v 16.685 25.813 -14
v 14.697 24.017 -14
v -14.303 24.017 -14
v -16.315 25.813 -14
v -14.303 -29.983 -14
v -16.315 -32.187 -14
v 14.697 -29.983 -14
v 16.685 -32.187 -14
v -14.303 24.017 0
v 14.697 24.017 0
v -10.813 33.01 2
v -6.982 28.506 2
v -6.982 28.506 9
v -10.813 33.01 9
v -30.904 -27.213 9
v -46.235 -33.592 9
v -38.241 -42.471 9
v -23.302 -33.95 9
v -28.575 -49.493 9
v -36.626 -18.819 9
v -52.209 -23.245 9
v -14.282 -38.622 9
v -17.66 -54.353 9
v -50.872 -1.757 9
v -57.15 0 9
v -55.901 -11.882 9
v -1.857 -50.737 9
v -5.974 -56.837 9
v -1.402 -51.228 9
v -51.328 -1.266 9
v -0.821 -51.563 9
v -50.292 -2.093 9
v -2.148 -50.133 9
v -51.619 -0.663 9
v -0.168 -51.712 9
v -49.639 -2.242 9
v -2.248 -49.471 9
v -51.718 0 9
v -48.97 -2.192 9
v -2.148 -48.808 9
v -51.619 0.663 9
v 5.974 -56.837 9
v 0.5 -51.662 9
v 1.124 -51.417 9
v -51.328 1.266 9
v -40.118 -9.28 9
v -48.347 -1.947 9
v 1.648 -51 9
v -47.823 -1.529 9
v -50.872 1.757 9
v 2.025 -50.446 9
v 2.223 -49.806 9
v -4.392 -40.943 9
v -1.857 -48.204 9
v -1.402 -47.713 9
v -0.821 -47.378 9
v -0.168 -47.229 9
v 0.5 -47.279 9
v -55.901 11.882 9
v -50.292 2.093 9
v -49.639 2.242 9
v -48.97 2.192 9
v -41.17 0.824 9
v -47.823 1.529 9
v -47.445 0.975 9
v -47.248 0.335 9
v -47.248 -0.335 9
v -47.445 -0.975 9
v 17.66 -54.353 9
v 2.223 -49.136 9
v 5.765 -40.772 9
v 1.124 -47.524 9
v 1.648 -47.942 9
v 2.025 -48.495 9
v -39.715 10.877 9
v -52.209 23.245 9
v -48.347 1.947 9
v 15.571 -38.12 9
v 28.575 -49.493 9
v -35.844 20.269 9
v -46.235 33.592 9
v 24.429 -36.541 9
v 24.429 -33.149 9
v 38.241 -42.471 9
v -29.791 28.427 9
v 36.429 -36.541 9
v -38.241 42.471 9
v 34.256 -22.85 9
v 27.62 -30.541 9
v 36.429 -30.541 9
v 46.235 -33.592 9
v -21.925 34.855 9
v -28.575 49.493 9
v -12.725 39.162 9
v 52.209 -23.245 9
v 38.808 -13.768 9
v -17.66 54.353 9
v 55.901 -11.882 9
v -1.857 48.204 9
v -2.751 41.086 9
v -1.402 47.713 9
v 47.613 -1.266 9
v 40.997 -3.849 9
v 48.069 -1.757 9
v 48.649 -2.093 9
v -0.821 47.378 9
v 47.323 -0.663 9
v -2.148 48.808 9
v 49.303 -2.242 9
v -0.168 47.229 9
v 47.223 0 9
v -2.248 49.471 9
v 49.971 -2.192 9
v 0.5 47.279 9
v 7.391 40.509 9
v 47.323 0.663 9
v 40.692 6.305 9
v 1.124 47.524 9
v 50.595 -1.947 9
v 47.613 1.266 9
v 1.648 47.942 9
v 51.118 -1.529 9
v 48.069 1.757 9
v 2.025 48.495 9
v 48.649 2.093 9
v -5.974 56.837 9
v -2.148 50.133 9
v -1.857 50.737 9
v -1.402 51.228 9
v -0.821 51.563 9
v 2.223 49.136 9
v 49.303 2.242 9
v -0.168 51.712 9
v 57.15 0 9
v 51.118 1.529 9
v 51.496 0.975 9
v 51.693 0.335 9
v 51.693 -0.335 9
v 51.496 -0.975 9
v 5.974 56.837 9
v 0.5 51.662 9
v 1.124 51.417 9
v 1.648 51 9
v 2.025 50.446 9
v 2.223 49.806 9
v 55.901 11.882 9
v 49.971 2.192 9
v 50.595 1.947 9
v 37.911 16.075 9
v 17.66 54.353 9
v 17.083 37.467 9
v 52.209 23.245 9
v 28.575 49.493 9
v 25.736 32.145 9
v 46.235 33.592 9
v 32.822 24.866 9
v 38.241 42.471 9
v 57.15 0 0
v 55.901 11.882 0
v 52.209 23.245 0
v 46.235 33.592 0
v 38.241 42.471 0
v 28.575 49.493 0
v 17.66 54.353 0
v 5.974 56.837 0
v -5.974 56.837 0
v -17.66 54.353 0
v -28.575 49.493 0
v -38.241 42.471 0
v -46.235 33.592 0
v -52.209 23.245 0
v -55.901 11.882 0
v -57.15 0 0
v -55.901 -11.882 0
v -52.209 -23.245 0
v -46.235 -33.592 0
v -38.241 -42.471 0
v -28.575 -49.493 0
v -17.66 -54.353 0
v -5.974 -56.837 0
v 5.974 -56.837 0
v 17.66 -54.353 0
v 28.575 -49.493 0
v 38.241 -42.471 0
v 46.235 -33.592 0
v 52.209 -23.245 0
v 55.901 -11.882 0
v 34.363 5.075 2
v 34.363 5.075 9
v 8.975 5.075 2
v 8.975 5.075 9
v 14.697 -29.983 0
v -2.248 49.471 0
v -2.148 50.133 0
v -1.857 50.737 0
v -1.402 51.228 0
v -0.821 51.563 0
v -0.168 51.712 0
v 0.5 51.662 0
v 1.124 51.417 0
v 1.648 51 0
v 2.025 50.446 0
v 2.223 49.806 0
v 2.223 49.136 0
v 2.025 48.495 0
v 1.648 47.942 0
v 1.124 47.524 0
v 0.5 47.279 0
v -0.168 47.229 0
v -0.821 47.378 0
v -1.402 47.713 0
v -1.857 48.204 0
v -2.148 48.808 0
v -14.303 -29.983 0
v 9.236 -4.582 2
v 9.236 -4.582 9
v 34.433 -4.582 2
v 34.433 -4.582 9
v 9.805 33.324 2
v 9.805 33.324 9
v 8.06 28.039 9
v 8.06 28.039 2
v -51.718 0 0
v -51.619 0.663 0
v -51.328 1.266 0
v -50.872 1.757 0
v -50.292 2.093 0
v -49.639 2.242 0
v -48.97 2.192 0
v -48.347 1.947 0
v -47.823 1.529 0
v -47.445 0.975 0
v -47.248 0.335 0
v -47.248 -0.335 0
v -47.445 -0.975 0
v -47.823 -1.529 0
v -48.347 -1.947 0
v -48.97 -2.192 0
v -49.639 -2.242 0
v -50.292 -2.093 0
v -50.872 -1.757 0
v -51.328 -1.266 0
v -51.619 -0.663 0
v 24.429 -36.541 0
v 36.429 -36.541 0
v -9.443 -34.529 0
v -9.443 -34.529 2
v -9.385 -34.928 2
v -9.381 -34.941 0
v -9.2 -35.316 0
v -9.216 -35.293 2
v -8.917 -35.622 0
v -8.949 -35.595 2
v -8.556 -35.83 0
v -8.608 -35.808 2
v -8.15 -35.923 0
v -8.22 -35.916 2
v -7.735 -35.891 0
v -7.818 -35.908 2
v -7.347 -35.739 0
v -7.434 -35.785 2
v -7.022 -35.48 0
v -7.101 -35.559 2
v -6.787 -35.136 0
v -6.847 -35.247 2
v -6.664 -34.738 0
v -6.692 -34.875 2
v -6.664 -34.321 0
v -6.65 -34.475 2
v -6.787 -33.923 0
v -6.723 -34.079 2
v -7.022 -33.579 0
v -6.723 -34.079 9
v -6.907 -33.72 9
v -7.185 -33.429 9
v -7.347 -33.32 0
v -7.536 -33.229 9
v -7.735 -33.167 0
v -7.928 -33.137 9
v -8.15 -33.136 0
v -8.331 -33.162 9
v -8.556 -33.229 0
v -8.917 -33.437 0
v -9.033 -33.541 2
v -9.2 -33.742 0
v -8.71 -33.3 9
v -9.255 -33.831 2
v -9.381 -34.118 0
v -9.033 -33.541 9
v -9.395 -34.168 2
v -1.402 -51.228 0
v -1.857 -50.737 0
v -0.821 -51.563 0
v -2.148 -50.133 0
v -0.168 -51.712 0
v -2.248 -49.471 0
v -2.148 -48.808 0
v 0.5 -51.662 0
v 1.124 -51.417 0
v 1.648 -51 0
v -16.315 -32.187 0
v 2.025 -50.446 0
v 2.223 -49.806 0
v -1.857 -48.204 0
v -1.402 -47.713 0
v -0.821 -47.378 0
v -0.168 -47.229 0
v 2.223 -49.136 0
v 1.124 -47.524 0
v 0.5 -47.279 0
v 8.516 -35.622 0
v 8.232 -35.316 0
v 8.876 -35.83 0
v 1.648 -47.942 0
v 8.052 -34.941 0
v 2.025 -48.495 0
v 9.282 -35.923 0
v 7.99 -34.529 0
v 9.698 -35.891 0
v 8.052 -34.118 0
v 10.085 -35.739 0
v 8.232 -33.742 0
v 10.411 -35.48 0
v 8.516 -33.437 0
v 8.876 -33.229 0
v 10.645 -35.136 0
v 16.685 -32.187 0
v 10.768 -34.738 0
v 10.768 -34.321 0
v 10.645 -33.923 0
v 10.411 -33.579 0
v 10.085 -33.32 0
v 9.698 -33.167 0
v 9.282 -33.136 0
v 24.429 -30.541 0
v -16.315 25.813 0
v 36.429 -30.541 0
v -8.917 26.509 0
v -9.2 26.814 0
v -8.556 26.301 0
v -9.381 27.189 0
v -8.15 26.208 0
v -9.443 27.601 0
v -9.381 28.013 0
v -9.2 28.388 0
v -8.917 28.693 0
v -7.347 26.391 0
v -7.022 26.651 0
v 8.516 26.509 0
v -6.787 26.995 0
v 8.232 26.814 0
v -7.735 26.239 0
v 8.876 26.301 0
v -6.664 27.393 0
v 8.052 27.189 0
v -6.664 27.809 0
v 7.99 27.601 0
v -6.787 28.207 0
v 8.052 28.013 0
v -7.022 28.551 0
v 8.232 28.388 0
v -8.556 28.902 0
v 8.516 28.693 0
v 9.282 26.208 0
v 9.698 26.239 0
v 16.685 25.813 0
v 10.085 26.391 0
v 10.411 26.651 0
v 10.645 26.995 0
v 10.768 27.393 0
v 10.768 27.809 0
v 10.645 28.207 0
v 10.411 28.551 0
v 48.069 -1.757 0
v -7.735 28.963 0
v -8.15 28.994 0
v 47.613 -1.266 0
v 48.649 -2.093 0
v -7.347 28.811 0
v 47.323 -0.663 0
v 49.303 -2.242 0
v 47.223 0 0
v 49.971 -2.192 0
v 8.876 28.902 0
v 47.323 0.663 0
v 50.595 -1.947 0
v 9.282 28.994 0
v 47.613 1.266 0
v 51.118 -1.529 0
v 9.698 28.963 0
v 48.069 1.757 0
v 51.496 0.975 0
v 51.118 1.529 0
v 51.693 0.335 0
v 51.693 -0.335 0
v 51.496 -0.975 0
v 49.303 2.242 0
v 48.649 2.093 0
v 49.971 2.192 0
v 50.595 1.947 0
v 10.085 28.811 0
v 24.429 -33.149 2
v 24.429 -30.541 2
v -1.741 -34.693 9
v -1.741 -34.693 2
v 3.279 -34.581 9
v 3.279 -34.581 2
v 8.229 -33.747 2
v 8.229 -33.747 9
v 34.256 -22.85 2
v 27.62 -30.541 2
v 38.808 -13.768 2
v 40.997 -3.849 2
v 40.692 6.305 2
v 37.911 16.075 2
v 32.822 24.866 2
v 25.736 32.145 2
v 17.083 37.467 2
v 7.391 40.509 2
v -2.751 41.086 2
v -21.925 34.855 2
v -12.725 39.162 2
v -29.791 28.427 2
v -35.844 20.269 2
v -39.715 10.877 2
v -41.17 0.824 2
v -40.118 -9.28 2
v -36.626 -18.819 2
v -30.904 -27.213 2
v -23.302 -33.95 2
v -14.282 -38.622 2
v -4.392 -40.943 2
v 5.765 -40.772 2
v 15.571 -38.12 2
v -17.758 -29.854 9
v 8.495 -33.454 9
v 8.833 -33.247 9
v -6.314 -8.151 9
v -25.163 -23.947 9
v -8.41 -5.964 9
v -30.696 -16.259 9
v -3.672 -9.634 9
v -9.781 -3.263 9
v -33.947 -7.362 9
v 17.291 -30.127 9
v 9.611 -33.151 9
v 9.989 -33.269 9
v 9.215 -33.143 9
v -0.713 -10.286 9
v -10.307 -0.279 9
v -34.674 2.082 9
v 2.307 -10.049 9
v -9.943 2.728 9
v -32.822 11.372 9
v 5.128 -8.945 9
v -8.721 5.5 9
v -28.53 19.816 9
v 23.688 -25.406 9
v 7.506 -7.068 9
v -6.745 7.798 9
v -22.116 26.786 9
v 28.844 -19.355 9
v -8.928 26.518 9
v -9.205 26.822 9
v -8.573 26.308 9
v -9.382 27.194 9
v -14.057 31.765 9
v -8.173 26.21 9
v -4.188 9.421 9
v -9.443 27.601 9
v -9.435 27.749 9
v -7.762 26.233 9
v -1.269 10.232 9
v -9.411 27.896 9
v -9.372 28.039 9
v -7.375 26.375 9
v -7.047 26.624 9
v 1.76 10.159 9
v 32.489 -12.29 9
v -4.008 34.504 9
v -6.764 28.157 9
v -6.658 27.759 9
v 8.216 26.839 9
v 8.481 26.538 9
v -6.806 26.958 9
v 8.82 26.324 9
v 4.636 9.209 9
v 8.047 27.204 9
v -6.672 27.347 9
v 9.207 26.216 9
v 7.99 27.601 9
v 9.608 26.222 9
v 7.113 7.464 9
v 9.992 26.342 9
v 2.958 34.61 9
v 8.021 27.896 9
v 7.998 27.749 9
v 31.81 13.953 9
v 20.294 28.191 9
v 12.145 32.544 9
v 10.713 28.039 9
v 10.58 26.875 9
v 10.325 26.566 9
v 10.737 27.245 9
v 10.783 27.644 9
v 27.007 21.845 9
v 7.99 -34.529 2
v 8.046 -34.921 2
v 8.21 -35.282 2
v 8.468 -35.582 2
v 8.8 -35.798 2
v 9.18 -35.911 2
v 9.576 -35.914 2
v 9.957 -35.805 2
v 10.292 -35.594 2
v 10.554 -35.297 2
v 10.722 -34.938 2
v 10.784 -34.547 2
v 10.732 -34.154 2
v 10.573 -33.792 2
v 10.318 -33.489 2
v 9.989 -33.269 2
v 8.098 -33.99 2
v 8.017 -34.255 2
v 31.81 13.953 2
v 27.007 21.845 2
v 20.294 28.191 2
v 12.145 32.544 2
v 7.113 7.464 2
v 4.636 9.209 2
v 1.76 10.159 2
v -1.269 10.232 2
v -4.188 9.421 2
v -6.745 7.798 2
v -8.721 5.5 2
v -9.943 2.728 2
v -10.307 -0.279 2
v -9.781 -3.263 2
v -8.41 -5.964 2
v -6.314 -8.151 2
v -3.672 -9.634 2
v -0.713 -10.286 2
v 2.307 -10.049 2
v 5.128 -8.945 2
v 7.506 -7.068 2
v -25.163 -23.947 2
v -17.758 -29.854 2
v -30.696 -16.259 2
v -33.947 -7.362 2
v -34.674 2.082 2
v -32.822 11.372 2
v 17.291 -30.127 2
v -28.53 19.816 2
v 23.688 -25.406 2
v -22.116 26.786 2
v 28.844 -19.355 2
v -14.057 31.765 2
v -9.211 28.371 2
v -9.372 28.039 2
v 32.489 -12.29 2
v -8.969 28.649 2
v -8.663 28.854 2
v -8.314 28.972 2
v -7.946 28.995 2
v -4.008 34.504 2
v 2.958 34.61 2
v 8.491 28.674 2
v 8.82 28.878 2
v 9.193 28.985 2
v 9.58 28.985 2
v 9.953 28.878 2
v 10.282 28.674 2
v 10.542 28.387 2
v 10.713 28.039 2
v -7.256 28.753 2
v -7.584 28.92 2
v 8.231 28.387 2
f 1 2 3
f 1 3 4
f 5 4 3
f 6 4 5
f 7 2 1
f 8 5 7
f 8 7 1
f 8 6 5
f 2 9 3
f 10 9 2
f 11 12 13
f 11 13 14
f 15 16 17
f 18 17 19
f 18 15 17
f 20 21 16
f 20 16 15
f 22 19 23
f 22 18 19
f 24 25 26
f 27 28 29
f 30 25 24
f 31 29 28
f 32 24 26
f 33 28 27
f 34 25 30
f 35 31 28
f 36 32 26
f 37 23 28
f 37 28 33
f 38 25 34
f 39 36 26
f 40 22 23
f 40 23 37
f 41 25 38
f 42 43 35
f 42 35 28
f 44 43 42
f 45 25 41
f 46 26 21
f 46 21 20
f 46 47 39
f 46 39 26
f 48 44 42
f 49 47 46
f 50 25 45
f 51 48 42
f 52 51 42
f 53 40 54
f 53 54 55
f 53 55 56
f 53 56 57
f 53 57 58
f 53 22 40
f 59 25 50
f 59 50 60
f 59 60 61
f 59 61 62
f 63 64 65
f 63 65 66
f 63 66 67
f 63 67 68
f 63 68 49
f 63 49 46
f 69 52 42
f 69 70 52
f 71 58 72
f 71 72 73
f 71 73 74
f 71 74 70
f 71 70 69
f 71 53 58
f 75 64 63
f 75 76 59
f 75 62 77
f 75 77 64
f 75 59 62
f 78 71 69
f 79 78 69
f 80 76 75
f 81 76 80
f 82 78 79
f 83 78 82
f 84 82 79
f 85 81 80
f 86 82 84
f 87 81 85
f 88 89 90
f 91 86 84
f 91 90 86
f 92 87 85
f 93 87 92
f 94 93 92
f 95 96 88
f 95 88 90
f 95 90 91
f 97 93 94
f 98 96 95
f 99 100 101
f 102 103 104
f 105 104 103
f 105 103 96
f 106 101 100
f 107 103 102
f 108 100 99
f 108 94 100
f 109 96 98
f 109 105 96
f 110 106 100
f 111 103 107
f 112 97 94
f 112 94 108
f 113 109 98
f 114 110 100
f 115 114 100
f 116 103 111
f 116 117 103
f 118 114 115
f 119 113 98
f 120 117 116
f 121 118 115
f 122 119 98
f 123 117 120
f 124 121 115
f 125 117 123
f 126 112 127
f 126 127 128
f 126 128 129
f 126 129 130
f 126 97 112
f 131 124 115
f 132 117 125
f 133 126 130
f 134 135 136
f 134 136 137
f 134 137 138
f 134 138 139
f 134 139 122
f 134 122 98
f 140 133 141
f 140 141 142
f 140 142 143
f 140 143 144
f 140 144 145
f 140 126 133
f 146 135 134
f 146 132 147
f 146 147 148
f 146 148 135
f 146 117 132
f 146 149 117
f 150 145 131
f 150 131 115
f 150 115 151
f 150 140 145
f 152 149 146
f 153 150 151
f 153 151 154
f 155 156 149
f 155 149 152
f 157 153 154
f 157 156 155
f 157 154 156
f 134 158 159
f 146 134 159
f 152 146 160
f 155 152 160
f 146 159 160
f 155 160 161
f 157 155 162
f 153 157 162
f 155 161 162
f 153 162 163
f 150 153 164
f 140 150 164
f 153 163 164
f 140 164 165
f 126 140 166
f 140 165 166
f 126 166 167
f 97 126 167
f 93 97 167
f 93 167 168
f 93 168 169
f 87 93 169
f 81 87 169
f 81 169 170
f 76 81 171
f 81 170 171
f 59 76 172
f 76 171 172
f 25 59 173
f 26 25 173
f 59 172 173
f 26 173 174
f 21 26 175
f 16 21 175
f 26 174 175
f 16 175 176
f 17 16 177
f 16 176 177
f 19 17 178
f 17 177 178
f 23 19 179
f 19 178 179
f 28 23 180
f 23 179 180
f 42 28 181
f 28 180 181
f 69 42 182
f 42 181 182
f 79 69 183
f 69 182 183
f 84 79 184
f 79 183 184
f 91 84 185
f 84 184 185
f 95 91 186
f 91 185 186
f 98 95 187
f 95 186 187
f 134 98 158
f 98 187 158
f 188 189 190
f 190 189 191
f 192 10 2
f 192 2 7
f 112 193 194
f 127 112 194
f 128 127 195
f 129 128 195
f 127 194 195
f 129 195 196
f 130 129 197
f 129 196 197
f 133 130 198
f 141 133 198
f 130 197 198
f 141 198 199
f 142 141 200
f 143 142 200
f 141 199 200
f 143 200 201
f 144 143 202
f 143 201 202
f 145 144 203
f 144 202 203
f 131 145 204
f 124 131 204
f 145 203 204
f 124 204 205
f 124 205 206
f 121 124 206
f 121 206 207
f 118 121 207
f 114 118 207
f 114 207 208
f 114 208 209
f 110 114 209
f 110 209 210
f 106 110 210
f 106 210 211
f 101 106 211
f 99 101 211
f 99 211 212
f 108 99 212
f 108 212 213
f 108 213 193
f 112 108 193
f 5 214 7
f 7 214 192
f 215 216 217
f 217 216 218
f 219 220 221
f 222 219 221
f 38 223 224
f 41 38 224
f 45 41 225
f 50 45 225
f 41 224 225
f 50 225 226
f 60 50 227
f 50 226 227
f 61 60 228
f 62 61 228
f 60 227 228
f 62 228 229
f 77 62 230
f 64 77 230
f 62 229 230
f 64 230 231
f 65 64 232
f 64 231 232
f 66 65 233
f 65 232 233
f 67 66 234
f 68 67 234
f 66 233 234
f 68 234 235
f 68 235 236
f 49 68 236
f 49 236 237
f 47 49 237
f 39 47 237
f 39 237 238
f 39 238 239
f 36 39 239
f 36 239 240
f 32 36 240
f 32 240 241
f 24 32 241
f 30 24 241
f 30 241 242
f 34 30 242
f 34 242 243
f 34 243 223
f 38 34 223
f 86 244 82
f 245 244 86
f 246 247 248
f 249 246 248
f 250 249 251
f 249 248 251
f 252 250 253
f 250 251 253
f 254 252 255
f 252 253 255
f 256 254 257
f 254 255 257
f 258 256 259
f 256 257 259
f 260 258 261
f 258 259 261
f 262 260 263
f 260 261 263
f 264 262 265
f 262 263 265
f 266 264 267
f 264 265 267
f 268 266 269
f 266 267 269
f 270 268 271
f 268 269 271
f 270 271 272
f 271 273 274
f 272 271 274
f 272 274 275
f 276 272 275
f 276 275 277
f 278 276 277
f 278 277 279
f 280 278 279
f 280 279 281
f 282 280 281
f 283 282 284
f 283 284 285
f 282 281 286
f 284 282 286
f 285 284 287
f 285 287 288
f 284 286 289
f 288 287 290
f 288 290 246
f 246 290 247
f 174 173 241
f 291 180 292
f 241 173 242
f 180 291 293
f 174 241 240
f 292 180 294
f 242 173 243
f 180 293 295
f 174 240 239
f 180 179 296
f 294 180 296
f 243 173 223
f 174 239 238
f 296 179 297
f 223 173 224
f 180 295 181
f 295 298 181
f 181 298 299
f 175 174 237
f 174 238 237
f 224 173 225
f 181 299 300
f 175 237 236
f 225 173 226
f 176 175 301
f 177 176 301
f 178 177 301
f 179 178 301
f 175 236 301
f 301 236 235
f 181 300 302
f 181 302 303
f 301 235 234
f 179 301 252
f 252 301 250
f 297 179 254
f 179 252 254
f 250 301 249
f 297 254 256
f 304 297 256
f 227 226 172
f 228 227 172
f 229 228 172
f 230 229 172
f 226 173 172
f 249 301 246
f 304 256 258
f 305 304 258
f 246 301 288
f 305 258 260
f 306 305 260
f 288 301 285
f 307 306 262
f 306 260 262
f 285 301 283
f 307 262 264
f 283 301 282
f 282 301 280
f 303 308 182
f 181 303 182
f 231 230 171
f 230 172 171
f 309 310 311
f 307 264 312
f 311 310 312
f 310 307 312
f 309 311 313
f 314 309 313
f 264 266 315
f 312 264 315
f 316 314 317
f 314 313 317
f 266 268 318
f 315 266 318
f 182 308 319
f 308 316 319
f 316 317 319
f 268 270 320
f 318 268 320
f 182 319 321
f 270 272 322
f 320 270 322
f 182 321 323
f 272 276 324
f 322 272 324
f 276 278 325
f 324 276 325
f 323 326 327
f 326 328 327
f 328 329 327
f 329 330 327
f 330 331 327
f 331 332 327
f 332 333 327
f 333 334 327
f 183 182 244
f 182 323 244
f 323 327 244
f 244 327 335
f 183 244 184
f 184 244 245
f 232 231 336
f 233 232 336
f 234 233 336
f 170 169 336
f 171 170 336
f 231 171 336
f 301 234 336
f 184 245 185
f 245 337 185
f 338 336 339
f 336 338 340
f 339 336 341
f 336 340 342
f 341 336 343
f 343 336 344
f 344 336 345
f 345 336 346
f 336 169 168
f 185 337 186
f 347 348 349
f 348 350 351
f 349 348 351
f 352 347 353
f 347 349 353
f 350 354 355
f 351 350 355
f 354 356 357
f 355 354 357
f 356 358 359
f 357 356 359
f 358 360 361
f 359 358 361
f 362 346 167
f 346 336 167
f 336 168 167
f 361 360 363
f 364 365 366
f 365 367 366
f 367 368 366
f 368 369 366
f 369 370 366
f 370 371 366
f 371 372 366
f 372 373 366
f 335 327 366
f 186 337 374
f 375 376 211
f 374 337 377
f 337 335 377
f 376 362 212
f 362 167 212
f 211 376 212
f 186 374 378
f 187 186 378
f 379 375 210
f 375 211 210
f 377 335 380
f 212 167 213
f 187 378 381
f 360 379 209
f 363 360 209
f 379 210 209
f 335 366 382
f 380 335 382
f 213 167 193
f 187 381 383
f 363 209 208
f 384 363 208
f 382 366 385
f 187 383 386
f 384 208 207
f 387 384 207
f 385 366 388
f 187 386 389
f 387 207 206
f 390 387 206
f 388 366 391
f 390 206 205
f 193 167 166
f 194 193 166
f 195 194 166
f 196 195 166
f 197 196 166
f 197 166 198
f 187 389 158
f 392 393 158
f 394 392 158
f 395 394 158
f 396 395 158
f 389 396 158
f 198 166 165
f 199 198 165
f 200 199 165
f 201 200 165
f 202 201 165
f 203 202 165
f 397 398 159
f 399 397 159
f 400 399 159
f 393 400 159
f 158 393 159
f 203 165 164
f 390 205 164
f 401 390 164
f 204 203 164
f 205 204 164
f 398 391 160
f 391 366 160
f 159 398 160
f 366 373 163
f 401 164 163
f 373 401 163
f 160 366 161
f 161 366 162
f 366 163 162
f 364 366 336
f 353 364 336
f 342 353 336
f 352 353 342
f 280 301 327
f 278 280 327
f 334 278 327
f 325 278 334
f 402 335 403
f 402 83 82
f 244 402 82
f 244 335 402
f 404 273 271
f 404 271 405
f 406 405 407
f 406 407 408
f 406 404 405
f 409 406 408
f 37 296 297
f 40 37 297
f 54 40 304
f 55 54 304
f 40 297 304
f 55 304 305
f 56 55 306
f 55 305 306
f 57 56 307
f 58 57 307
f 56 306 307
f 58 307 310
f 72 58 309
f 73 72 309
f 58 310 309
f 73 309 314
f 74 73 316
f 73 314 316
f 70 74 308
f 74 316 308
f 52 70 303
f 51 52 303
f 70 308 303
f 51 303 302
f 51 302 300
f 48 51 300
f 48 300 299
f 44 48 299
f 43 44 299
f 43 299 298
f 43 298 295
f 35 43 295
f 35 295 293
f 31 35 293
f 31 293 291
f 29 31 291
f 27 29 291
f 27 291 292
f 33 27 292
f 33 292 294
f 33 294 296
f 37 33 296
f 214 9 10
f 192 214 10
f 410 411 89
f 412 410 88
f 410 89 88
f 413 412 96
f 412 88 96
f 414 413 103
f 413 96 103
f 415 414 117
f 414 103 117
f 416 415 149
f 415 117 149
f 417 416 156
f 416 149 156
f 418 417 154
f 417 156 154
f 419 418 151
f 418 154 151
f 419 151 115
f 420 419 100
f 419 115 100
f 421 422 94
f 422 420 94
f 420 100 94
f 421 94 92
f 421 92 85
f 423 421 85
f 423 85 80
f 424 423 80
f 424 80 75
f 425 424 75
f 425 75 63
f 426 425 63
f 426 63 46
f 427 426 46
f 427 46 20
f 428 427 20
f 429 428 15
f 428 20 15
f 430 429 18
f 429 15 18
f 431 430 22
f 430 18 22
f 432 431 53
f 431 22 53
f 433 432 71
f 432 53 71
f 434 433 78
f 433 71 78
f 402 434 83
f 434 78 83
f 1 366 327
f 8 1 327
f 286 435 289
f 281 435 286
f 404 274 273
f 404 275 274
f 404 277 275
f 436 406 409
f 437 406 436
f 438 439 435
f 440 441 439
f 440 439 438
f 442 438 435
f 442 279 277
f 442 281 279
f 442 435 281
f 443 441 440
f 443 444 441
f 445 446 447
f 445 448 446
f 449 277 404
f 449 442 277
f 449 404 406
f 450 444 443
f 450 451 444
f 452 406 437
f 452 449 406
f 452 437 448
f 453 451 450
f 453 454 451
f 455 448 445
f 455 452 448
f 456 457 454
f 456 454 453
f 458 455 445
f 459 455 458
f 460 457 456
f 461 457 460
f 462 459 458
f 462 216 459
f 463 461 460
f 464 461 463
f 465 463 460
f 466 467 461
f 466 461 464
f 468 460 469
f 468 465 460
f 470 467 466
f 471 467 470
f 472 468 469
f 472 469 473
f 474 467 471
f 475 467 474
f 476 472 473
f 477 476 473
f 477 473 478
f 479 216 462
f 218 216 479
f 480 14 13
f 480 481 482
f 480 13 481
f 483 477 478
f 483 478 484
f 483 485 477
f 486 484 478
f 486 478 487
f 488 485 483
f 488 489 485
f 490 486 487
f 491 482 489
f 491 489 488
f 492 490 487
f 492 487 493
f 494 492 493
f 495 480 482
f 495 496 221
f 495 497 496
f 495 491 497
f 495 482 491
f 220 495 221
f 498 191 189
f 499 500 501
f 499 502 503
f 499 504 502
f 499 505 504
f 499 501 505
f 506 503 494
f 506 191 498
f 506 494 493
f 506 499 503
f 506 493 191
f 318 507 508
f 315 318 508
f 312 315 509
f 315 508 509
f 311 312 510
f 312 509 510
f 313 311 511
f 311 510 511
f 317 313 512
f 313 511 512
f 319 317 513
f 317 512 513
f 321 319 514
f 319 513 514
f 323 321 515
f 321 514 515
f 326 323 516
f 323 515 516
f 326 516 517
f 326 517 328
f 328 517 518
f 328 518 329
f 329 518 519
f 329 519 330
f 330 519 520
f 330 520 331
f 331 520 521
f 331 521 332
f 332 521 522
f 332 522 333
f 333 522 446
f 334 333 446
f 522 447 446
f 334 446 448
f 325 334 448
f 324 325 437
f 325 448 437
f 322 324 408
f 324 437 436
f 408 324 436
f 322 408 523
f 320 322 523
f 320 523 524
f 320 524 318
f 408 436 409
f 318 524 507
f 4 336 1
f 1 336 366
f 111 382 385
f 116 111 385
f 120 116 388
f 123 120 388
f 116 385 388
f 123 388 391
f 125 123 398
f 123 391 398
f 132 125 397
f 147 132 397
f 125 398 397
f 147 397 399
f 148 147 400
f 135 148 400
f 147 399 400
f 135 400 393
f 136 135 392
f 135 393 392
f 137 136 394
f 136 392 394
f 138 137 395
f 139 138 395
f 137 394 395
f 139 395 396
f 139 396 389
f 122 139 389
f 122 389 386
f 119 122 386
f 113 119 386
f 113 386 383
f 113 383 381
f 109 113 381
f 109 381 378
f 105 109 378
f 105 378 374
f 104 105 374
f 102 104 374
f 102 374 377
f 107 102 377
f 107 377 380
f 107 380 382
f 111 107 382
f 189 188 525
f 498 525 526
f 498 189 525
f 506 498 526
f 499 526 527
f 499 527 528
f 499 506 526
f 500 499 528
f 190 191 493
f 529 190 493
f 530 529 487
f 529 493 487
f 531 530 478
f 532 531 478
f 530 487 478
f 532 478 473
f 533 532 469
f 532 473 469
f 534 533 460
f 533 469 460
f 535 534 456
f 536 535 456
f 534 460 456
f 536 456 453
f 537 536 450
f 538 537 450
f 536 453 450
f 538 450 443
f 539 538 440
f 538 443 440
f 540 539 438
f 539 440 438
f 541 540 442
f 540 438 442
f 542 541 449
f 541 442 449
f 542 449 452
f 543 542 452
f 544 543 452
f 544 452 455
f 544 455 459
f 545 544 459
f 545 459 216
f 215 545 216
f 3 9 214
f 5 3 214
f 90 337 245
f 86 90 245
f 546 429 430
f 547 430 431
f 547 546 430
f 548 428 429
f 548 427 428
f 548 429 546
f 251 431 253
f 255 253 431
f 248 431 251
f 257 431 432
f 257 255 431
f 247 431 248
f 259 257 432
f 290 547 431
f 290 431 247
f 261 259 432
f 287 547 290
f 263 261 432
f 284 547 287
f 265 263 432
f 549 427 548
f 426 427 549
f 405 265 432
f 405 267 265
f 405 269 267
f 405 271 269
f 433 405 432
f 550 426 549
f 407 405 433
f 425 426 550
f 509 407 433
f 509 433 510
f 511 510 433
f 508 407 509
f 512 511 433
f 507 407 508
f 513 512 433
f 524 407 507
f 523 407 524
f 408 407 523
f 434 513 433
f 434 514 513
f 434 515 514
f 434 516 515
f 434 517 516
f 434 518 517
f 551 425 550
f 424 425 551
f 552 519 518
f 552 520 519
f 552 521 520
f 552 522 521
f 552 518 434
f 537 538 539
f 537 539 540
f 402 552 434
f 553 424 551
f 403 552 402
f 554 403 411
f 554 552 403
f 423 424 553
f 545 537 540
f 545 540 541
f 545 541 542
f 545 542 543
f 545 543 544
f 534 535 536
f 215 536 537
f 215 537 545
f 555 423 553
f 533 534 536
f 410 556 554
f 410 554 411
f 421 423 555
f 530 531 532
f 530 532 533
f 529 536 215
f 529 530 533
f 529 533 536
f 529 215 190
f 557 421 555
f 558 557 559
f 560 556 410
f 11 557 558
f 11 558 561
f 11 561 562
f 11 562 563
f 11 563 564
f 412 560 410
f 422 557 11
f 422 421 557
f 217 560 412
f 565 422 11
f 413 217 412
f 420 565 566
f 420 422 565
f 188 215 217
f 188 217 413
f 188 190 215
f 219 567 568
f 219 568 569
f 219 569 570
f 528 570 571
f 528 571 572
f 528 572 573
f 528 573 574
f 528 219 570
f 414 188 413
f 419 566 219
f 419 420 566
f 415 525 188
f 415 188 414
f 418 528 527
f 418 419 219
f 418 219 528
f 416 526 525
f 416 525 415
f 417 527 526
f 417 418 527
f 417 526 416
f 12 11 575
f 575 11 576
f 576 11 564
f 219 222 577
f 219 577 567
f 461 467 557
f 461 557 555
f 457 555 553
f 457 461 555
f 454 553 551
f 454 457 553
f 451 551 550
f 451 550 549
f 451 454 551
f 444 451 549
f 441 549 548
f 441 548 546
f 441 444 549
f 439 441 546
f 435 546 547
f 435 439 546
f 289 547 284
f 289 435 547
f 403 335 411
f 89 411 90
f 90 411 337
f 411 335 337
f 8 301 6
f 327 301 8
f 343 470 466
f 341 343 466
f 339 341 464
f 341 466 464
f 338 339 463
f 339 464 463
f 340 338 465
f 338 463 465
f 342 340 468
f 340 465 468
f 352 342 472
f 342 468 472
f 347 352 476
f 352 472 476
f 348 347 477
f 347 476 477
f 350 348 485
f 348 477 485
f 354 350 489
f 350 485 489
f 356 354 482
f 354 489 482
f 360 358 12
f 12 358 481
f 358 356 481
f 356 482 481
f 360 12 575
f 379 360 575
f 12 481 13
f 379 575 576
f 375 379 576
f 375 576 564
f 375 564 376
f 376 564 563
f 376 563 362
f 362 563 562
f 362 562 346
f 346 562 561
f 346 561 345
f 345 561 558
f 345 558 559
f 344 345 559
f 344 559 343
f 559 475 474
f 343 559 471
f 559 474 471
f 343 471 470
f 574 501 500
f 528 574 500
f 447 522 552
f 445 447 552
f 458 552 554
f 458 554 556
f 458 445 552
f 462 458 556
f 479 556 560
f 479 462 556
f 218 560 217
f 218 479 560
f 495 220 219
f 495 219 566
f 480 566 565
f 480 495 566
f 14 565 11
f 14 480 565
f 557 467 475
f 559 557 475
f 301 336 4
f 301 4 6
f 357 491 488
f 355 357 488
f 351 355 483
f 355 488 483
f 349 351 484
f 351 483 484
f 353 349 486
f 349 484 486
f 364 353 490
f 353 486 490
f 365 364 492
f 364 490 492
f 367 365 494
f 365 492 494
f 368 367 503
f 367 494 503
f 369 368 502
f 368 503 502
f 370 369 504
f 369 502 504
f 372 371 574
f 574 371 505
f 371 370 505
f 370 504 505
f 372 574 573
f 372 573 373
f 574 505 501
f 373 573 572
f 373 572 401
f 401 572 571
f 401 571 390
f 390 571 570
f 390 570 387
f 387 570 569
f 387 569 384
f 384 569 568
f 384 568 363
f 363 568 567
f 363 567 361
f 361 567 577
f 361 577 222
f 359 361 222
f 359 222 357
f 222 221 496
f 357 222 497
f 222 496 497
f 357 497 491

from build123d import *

# Parameters (mm, degrees)
F0_R      = 57.15
F1_DEPTH  = 9
F2_R      = 41.1777557501
F2_R_2    = 34.7361553424
F3_DEPTH  = 7
F5_DEPTH  = 7
F6_W      = 12
F6_H      = 6
F7_DEPTH  = 9
F9_D      = 4.4958
F10_W     = 33
F10_H     = 58
F10_W_2   = 29
F10_H_2   = 54
F11_DEPTH = 14
F13_D     = 2.794
F15_DEPTH = 7


with BuildPart() as f1:
    # F0 (on Top) → F1 (new body)
    with BuildSketch(Plane.XY):
        Circle(F0_R)
    extrude(amount=F1_DEPTH)

    # F2 (on face) → F3 (cut)
    with BuildSketch(Plane.XY.offset(9)):
        Circle(F2_R)
        Circle(F2_R_2, mode=Mode.SUBTRACT)
    extrude(amount=-F3_DEPTH, mode=Mode.SUBTRACT)

    # F4 (on face) → F5 (cut)
    with BuildSketch(Plane.XY.offset(9)):
        with BuildLine():
            ThreePointArc((9.2364512329, -4.5815780759), (10.0382703258, -2.3528743932), (10.3103292403, 0))
            ThreePointArc((10.3103292403, 0), (9.9709085428, 2.6237133751), (8.9749942157, 5.0746790905))
            Line((8.9749942157, 5.0746790905), (8.9749942157, -4.5815780759))
            Line((8.9749942157, -4.5815780759), (9.2364512329, -4.5815780759))
        make_face()
        with BuildLine():
            Line((37.7700850368, 5.0746790905), (34.3634707226, 5.0746790905))
            ThreePointArc((34.3634707226, 5.0746790905), (34.6428588969, 2.544172837), (34.7361553424, 0))
            ThreePointArc((34.7361553424, 0), (34.6602041198, -2.2958088649), (34.4326825895, -4.5815780759))
            Line((34.4326825895, -4.5815780759), (37.7700850368, -4.5815780759))
            Line((37.7700850368, -4.5815780759), (37.7700850368, 5.0746790905))
        make_face()
        with BuildLine():
            Line((8.9749942157, -4.5815780759), (8.9749942157, 5.0746790905))
            ThreePointArc((8.9749942157, 5.0746790905), (-10.3065518942, -0.27906468), (9.2364512329, -4.5815780759))
            Line((9.2364512329, -4.5815780759), (8.9749942157, -4.5815780759))
        make_face()
        with BuildLine():
            ThreePointArc((8.9749942157, 5.0746790905), (9.9709085428, 2.6237133751), (10.3103292403, 0))
            ThreePointArc((10.3103292403, 0), (10.0382703258, -2.3528743932), (9.2364512329, -4.5815780759))
            Line((9.2364512329, -4.5815780759), (34.4326825895, -4.5815780759))
            ThreePointArc((34.4326825895, -4.5815780759), (34.6602041198, -2.2958088649), (34.7361553424, 0))
            ThreePointArc((34.7361553424, 0), (34.6428588969, 2.544172837), (34.3634707226, 5.0746790905))
            Line((34.3634707226, 5.0746790905), (8.9749942157, 5.0746790905))
        make_face()
    extrude(amount=-F5_DEPTH, mode=Mode.SUBTRACT)

    # F6 (on face) → F7 (cut)
    with BuildSketch(Plane(origin=(0, 0, 0), x_dir=(1, 0, 0), z_dir=(0, 0, -1))):
        with Locations((30.4291332662, 33.5408807993)):
            Rectangle(F6_W, F6_H)
    extrude(amount=-F7_DEPTH, mode=Mode.SUBTRACT)

    # F9 (through all)
    with Locations(Plane.XY.offset(9)):
        with Locations((0, 49.4705886591), (-49.4705886591, 0), (0, -49.4705886591), (49.4705886591, 0)):
            Hole(F9_D / 2)

    # F10 (on face) → F11 (join)
    with BuildSketch(Plane(origin=(0, 0, 0), x_dir=(1, 0, 0), z_dir=(0, 0, -1))):
        with Locations((0.185111627, 3.1867184639)):
            Rectangle(F10_W, F10_H)
        with Locations((0.1965364888, 2.9830217808)):
            Rectangle(F10_W_2, F10_H_2, mode=Mode.SUBTRACT)
    extrude(amount=F11_DEPTH)

    # F13 (through all)
    with Locations(Plane(origin=(0, 0, 0), x_dir=(1, 0, 0), z_dir=(0, 0, -1))):
        with Locations((-8.0456975847, 34.5294550061), (9.3866474926, 34.5294550061), (-8.0456975847, -27.6012141258), (9.3866474926, -27.6012141258)):
            Hole(F13_D / 2)

    # F14 (on face) → F15 (cut)
    with BuildSketch(Plane.XY.offset(9)):
        with BuildLine():
            Line((-14.0573482538, 31.7646257344), (-9.3722739345, 28.0391686762))
            ThreePointArc((-9.3722739345, 28.0391686762), (-8.3136402911, 28.9722778391), (-6.9816011946, 28.5063703953))
            Line((-6.9816011946, 28.5063703953), (-10.8128362283, 33.0103477817))
            ThreePointArc((-10.8128362283, 33.0103477817), (-12.4506817042, 32.4280898771), (-14.0573482538, 31.7646257344))
        make_face()
        with BuildLine():
            ThreePointArc((12.1452810093, 32.5437034951), (10.9819164525, 32.9544837466), (9.804697926, 33.3236910704))
            Line((9.804697926, 33.3236910704), (8.0600711429, 28.0391686762))
            ThreePointArc((8.0600711429, 28.0391686762), (9.3866474926, 28.9982141258), (10.7132238424, 28.0391686762))
            Line((10.7132238424, 28.0391686762), (12.1452810093, 32.5437034951))
        make_face()
    extrude(amount=-F15_DEPTH, mode=Mode.SUBTRACT)


solid = f1.part
